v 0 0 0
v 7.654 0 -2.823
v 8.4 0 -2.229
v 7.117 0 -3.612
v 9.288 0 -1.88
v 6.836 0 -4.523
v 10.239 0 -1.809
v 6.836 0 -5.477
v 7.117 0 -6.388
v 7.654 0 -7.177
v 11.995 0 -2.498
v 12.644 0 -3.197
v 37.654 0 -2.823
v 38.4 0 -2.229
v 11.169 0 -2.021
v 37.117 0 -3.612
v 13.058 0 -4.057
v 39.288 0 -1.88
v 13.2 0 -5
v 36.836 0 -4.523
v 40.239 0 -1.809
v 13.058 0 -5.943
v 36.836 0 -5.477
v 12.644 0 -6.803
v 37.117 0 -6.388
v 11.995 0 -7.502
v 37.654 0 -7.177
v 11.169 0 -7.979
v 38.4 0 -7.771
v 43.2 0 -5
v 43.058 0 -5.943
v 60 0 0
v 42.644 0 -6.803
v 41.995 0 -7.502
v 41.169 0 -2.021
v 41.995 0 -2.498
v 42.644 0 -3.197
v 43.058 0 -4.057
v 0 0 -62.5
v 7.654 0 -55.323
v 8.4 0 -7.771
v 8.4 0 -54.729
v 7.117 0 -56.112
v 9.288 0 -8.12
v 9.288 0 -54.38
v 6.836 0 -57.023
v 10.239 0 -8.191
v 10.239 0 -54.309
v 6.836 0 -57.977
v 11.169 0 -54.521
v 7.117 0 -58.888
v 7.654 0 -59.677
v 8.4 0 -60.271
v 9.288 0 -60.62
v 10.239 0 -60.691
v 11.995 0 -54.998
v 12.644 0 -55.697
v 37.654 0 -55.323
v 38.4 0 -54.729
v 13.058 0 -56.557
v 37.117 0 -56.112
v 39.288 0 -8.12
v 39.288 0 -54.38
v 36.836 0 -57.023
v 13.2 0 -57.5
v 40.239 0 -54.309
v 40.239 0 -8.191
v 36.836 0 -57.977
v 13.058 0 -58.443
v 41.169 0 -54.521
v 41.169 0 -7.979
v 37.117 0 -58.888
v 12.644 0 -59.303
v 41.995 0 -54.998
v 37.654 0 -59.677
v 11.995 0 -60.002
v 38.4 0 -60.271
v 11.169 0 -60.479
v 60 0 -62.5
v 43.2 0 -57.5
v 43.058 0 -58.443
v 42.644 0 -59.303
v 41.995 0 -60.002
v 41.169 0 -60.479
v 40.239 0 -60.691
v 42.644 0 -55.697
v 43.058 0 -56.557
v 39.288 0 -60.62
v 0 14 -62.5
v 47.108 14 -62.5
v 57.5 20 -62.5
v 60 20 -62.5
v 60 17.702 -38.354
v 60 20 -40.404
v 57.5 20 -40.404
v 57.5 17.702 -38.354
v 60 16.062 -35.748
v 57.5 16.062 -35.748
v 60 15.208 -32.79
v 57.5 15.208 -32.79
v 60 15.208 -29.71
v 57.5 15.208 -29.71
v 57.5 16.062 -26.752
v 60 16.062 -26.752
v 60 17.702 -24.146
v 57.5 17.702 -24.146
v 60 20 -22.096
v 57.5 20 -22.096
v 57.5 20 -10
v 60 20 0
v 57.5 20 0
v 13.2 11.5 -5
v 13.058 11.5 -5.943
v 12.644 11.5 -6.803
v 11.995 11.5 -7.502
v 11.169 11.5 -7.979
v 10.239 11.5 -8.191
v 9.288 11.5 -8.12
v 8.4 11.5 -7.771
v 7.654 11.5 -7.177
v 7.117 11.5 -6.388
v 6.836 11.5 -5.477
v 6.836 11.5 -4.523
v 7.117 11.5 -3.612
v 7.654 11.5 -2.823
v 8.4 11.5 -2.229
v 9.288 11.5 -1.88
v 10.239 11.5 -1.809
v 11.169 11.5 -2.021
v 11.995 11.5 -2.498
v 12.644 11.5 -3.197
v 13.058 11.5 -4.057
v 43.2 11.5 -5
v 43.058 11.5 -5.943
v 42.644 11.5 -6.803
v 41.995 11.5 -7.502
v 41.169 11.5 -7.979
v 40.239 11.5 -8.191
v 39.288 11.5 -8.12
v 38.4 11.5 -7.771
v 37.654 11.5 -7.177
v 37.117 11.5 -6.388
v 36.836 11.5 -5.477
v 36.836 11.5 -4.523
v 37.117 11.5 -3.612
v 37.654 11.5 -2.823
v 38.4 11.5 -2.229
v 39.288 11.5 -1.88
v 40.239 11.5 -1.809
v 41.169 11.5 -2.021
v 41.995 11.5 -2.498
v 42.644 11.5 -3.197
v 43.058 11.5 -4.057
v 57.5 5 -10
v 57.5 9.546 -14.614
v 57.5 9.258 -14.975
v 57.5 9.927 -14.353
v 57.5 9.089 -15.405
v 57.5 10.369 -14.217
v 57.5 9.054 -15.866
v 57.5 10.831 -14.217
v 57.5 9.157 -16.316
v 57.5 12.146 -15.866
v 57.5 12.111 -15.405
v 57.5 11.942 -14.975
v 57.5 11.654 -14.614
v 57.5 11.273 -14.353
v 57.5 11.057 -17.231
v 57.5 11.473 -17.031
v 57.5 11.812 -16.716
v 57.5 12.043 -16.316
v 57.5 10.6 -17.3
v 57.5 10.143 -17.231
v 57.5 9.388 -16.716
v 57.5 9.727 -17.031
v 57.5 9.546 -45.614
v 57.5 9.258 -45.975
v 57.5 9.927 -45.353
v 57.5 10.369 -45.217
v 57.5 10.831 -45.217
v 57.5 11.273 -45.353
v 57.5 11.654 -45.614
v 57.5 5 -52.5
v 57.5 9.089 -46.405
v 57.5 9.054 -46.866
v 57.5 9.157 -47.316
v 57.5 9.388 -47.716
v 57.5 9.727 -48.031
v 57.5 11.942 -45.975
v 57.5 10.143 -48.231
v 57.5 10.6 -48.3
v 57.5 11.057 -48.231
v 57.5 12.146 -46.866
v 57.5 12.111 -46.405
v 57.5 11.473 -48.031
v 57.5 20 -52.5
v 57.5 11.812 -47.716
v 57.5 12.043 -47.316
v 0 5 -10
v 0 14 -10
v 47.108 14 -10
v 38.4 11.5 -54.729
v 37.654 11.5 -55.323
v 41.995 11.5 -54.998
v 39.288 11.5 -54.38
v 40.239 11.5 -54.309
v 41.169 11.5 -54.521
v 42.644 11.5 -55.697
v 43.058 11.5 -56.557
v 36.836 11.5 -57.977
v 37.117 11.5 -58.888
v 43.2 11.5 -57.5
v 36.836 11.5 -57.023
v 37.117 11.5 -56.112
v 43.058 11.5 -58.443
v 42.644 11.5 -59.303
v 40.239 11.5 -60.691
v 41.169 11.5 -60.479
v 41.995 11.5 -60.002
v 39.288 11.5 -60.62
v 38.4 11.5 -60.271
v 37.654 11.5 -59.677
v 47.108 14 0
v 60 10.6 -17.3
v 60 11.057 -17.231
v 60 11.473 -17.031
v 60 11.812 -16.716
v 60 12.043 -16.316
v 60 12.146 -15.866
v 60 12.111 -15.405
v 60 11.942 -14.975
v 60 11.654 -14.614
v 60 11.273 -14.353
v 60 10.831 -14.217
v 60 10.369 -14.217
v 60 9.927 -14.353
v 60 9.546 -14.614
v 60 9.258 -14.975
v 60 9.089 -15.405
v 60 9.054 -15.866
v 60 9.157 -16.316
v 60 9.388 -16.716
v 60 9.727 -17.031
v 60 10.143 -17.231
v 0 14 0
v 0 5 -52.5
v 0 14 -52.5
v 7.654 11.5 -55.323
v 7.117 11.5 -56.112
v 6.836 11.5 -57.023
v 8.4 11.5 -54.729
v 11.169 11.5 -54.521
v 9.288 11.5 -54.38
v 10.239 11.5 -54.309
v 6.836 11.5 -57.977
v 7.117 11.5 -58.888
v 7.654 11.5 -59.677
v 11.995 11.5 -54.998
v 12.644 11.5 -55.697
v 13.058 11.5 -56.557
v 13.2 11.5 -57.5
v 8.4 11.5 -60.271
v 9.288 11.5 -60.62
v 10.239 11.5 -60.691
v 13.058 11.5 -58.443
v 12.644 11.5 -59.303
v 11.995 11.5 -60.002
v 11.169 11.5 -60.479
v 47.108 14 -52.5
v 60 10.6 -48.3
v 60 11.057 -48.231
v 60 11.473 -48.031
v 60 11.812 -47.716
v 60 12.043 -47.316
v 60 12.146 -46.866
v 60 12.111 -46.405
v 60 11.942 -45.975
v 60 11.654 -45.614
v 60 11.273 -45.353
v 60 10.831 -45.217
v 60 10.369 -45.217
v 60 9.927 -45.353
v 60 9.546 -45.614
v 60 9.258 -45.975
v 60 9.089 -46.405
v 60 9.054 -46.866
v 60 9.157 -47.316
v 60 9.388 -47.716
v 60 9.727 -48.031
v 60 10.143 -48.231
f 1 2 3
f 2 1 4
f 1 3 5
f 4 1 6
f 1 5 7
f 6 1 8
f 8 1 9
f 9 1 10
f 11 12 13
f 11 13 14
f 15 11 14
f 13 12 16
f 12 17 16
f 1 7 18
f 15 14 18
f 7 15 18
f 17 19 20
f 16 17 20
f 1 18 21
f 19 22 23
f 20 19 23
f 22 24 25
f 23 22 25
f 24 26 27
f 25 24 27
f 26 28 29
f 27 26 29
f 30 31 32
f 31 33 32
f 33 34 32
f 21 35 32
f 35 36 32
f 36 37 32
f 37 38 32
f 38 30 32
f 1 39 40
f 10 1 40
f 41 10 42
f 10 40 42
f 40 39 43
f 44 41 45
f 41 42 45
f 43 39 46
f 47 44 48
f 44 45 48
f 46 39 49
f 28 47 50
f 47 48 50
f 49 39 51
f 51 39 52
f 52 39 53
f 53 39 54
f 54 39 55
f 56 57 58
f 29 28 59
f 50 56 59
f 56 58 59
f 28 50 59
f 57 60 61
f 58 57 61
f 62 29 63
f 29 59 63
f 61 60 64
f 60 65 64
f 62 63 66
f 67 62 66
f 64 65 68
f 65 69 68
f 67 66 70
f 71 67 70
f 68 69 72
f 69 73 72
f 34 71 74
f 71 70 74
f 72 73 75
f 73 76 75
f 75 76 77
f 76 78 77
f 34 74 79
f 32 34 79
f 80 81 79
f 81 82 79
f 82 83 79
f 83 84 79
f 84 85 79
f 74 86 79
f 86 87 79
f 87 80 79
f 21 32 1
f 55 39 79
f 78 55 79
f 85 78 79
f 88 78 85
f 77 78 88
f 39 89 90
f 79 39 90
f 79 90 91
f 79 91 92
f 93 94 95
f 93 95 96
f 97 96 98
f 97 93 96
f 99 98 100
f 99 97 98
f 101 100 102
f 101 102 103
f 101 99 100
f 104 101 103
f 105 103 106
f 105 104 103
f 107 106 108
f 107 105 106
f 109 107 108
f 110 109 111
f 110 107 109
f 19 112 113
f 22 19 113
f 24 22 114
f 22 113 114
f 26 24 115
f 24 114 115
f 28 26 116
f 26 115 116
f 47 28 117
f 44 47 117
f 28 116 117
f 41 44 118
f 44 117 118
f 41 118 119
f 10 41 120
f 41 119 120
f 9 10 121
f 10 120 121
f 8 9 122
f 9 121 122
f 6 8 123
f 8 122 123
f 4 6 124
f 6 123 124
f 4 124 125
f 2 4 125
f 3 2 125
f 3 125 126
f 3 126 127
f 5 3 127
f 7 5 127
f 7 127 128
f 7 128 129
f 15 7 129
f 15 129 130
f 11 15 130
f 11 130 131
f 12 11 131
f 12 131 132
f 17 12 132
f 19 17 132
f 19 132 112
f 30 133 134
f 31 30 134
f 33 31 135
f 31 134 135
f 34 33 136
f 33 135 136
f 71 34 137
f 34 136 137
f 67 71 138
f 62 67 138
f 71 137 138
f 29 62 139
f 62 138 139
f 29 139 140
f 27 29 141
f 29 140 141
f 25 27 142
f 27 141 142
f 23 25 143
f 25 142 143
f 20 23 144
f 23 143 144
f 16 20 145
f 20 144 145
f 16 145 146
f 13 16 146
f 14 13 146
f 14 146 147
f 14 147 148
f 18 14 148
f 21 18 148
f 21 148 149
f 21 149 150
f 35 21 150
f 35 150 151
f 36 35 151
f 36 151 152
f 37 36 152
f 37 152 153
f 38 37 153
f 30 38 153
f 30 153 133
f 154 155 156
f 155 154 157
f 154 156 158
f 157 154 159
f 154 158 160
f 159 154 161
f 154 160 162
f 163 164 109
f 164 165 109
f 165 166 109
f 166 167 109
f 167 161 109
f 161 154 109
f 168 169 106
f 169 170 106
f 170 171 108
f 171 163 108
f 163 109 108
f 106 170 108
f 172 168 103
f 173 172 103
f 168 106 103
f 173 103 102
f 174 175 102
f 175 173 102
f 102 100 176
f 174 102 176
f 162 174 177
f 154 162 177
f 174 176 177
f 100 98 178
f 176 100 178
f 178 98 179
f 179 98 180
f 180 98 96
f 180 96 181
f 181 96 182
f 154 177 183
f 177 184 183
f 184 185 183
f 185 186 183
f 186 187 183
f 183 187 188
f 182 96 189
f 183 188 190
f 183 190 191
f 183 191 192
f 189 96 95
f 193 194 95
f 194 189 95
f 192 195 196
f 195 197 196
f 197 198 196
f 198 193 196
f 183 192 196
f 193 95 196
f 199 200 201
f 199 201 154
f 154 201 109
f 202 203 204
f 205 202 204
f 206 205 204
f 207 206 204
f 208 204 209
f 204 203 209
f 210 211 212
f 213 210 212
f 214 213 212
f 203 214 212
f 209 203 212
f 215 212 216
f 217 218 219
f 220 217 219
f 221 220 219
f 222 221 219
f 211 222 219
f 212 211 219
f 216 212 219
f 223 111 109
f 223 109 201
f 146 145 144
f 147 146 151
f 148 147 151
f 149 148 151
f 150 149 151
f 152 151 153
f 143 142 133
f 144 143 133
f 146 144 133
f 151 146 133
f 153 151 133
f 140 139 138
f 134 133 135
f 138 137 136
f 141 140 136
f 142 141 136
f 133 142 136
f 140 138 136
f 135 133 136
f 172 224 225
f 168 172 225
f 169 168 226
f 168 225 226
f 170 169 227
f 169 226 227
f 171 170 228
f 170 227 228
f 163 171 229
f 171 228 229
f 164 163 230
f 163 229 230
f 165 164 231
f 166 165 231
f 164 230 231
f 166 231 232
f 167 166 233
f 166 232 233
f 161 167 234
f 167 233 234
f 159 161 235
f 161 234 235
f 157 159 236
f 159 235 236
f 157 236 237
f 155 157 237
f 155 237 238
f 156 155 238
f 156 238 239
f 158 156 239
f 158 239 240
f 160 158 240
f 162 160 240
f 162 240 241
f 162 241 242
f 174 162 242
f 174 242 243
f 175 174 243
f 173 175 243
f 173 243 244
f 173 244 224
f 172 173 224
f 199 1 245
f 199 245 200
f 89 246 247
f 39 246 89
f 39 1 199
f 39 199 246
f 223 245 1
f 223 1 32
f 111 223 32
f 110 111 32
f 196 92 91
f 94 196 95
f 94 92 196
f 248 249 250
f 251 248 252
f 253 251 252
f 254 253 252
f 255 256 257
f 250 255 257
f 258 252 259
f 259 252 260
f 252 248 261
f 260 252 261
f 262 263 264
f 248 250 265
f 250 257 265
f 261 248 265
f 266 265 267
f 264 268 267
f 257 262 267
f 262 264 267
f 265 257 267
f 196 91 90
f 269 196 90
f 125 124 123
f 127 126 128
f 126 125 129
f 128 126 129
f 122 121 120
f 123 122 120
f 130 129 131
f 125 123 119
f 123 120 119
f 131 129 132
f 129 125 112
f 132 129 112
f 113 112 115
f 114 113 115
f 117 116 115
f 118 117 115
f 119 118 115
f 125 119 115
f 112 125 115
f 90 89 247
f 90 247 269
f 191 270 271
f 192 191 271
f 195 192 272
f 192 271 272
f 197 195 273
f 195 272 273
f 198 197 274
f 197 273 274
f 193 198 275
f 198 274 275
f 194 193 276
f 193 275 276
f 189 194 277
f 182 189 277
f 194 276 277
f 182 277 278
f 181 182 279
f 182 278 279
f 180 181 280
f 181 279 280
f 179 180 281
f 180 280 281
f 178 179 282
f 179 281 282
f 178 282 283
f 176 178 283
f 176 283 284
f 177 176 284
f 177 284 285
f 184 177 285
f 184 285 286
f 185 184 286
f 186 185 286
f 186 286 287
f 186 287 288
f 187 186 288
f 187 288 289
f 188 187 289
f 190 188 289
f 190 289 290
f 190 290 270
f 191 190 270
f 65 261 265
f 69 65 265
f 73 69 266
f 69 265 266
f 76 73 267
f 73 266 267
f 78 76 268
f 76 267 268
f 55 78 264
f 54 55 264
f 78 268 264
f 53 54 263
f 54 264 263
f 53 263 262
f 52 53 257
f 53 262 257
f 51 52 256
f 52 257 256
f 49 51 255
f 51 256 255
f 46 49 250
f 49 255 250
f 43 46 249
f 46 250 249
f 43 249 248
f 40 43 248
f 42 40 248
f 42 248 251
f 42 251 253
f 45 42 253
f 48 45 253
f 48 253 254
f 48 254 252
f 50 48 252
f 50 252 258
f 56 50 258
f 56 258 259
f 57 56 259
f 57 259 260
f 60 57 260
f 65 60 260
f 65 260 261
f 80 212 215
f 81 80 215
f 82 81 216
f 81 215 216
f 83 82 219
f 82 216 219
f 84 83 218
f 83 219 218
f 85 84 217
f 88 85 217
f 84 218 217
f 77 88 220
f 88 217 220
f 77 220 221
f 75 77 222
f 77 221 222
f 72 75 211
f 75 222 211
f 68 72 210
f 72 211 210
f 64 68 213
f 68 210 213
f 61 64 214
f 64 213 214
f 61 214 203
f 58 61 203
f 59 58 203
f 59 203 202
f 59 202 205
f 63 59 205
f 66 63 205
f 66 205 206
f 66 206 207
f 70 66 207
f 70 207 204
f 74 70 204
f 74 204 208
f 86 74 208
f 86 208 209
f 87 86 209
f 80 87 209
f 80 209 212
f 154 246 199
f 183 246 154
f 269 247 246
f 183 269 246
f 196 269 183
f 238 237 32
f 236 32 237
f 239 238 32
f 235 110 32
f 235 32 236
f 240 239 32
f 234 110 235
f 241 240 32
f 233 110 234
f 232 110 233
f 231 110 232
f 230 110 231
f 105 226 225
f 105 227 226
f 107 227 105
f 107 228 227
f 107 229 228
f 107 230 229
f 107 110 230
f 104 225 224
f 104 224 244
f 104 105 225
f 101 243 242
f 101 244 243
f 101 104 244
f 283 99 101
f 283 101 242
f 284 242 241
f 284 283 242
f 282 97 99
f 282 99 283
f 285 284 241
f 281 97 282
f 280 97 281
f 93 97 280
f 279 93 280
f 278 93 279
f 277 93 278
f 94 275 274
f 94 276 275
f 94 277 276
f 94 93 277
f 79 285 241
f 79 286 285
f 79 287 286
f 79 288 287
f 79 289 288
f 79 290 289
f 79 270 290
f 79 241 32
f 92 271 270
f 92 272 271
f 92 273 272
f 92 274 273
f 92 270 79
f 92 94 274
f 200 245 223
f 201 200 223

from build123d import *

# Parameters (mm, degrees)
SKETCH1_W            = 60
SKETCH1_H            = 62.5
BOSS_EXTRUDE1_DEPTH  = 5
BOSS_EXTRUDE2_DEPTH  = 2.5
BOSS_EXTRUDE3_DEPTH  = 10
BOSS_EXTRUDE4_DEPTH  = 10
SKETCH4_R            = 1.55
CUT_EXTRUDE1_DEPTH   = 10
M5_CLEARANCE_HOLE1_D = 6.4
SKETCH11_W           = 47.107695155
SKETCH11_H           = 10
BOSS_EXTRUDE5_DEPTH  = 2.5


with BuildPart() as part:
    # Sketch1 → Boss-Extrude1 (new body)
    with BuildSketch(Plane(origin=(0, 0, 0), x_dir=(1, 0, 0), z_dir=(0, 1, 0))):
        with Locations((30, 31.25)):
            Rectangle(SKETCH1_W, SKETCH1_H)
    extrude(amount=BOSS_EXTRUDE1_DEPTH)

    # Sketch2 → Boss-Extrude2 (add)
    with BuildSketch(Plane(origin=(60, 0, 0), x_dir=(0, 0, -1), z_dir=(1, 0, 0))):
        with BuildLine():
            Line((0, 20), (0, 5))
            Line((0, 5), (62.5, 5))
            Line((62.5, 5), (62.5, 20))
            Line((62.5, 20), (40.403687781, 20))
            ThreePointArc((40.403687781, 20), (31.25, 15.1), (22.096312219, 20))
            Line((22.096312219, 20), (0, 20))
        make_face()
    extrude(amount=-BOSS_EXTRUDE2_DEPTH)

    # Sketch3 → Boss-Extrude3 (add)
    with BuildSketch(Plane.XY):
        Polygon((57.5, 20), (31.519237886, 5), (57.5, 5), align=None)
    boss_extrude3 = extrude(amount=-BOSS_EXTRUDE3_DEPTH)

    # Sketch8 → Boss-Extrude4 (add)
    with BuildSketch(Plane(origin=(0, 0, 0), x_dir=(-1, 0, 0), z_dir=(0, 0, -1))):
        Polygon((-47.107695155, 14), (-47.107695155, 5), (-33.38717798, 5), (-24.156521096, 5), (0, 5), (0, 14), align=None)
    boss_extrude4 = extrude(amount=BOSS_EXTRUDE4_DEPTH)

    # Mirror1: Boss-Extrude3, Boss-Extrude4 across plane
    add(boss_extrude3.mirror(Plane.XY.offset(-31.25)))
    add(boss_extrude4.mirror(Plane.XY.offset(-31.25)))

    # Sketch4 → Cut-Extrude1 (cut)
    with BuildSketch(Plane(origin=(60, 0, 0), x_dir=(0, 0, -1), z_dir=(1, 0, 0))):
        with Locations((15.75, 10.6)):
            Circle(SKETCH4_R)
        with Locations((46.75, 10.6)):
            Circle(SKETCH4_R)
    extrude(amount=-CUT_EXTRUDE1_DEPTH, mode=Mode.SUBTRACT)

    # M5 Clearance Hole1 (through all)
    with Locations(Plane(origin=(0, 0, 0), x_dir=(-1, 0, 0), z_dir=(0, -1, 0))):
        with Locations((-40, 57.5), (-10, 57.5), (-40, 5), (-10, 5)):
            Hole(M5_CLEARANCE_HOLE1_D / 2)

    # Sketch11 → Boss-Extrude5 (add)
    with BuildSketch(Plane(origin=(0, 14, 0), x_dir=(1, 0, 0), z_dir=(0, 1, 0))):
        with Locations((23.553847578, 57.5)):
            Rectangle(SKETCH11_W, SKETCH11_H)
        with Locations((23.553847578, 5)):
            Rectangle(SKETCH11_W, SKETCH11_H)
    extrude(amount=-BOSS_EXTRUDE5_DEPTH)


solid = part.part
